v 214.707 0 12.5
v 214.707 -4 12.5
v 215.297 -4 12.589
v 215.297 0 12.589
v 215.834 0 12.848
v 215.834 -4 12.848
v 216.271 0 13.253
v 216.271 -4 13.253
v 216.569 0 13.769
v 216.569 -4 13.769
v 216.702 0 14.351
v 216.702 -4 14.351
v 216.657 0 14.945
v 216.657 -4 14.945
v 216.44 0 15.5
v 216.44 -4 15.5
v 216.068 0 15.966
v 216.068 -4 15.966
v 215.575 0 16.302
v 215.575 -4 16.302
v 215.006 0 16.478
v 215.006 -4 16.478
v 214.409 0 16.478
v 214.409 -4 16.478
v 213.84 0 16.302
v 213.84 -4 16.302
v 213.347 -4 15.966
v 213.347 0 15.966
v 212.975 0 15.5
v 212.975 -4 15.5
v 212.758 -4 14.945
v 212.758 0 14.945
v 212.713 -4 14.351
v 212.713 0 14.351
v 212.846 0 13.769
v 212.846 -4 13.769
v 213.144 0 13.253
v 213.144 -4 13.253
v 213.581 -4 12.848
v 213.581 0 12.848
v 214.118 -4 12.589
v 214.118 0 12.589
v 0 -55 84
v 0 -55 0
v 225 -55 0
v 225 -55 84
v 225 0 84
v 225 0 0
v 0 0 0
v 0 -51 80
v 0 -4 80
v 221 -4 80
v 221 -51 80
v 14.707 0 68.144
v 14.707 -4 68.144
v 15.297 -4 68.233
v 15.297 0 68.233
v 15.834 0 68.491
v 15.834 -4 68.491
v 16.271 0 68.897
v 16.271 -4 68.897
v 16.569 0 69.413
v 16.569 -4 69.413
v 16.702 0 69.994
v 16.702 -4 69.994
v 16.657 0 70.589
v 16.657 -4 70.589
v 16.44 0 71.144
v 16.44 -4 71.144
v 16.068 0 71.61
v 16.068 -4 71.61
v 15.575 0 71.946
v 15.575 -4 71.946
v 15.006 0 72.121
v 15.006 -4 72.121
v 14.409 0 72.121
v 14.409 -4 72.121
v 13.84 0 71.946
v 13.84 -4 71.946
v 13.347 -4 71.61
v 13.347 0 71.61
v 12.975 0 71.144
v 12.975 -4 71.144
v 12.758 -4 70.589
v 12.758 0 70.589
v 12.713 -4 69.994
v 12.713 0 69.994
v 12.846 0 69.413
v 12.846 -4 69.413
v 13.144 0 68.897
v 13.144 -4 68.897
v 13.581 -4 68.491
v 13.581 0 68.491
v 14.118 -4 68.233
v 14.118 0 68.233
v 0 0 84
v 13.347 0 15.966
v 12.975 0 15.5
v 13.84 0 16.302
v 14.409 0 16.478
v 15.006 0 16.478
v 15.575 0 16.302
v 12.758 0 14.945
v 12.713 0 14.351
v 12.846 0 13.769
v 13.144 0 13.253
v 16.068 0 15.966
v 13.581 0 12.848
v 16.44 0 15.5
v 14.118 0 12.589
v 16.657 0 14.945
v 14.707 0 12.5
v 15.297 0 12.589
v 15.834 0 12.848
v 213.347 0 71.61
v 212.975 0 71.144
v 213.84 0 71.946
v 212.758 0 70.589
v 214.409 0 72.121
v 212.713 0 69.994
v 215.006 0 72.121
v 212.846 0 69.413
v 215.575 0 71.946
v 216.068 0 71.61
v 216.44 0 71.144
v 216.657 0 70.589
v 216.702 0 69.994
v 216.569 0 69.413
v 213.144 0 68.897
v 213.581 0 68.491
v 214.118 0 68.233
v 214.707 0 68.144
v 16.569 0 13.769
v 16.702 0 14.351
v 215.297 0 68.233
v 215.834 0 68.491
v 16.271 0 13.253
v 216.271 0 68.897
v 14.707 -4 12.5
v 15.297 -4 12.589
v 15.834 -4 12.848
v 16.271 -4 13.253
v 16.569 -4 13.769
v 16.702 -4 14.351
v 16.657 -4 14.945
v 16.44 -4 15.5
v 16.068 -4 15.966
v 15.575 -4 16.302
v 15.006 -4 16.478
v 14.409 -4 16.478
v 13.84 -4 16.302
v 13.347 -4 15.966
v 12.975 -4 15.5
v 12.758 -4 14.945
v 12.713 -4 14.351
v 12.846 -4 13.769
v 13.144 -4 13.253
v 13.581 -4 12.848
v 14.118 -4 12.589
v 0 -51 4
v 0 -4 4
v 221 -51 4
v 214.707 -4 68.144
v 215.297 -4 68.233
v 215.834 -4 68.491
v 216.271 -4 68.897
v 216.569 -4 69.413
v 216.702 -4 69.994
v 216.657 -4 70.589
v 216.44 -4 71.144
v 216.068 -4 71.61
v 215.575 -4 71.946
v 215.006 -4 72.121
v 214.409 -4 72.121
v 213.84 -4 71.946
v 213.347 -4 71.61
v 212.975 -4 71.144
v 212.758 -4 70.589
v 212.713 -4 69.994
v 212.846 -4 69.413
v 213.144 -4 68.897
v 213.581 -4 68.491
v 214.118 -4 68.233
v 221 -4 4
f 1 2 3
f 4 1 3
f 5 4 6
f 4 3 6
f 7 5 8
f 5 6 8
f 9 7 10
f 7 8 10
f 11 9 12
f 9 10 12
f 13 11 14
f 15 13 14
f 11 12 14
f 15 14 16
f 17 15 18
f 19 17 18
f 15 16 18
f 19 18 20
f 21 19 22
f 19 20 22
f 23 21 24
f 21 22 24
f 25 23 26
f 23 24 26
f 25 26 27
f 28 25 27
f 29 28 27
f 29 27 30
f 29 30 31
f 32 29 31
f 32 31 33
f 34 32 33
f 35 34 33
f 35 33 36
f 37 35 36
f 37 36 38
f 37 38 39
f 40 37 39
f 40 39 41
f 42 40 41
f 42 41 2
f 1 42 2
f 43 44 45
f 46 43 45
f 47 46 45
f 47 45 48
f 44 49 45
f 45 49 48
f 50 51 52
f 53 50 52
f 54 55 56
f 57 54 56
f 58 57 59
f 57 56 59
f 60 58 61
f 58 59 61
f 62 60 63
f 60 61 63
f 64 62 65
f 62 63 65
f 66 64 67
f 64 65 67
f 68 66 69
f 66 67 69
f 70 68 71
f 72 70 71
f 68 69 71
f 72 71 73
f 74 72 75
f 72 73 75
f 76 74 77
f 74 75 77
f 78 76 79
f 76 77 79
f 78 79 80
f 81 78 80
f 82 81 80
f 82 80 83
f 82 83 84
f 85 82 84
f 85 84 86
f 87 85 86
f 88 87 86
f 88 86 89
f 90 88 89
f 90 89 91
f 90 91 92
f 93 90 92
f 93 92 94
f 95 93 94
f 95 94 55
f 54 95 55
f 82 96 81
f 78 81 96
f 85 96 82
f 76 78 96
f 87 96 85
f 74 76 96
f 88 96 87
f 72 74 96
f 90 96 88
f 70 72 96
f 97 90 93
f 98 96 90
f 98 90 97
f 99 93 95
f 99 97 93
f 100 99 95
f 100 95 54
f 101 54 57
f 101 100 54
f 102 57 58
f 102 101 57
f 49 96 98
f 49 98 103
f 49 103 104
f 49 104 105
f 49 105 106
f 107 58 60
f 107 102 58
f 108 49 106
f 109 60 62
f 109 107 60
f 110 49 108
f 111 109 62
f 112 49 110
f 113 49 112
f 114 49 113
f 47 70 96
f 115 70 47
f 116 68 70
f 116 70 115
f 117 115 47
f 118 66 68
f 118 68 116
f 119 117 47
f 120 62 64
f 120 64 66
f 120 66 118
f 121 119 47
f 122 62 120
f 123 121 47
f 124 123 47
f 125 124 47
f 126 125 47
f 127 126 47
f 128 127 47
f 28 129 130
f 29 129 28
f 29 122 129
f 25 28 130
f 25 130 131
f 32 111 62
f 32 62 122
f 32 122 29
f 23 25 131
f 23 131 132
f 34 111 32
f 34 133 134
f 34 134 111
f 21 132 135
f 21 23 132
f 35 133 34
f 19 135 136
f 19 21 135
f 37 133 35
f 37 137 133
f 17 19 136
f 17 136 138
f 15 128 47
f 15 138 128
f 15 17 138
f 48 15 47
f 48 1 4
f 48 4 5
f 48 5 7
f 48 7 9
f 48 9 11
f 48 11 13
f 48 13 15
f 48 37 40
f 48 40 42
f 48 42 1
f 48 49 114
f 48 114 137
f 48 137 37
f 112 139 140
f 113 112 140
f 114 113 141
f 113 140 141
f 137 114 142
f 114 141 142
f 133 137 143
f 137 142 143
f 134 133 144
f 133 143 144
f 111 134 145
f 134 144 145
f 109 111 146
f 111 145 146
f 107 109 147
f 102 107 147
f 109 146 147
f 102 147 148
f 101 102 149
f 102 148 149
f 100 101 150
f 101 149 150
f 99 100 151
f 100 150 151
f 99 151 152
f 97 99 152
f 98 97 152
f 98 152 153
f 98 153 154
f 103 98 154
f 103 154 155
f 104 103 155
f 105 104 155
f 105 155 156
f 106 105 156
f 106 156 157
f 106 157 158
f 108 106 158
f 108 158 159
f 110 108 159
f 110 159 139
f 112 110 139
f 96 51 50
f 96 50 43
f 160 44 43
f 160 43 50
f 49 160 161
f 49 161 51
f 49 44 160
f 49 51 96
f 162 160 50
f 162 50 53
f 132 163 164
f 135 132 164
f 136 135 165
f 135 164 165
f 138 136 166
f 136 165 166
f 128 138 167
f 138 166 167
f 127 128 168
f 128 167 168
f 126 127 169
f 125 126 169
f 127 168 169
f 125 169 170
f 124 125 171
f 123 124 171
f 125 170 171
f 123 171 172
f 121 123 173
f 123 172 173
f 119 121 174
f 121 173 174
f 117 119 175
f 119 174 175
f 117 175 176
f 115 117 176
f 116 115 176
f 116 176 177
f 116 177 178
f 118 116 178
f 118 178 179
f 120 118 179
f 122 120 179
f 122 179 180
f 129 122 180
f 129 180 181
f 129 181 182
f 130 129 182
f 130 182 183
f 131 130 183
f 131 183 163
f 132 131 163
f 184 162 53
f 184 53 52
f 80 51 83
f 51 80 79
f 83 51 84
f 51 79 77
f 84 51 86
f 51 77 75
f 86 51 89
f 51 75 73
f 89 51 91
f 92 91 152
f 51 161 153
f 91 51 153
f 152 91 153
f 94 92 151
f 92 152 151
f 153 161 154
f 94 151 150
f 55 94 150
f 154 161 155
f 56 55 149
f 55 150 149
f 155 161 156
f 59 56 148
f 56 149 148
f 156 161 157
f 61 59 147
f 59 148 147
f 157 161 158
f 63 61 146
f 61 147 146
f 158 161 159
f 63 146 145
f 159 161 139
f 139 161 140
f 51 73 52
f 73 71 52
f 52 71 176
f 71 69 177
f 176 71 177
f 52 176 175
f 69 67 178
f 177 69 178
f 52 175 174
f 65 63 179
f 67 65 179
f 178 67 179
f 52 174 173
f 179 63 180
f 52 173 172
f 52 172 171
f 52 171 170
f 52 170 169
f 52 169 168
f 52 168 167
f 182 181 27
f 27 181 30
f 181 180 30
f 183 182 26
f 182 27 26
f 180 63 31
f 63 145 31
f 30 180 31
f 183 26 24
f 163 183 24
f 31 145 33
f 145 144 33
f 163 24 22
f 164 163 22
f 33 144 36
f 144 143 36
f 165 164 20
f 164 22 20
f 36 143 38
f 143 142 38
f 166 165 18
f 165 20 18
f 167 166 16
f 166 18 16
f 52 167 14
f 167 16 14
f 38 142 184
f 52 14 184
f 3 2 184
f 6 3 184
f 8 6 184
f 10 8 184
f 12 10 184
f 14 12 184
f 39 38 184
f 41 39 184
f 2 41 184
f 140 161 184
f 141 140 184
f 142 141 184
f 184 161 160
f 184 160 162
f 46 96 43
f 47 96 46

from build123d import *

# Parameters (mm, degrees)
SKETCH1_W           = 225
SKETCH1_H           = 55
BOSS_EXTRUDE1_DEPTH = 84
SHELL1_T            = -4
SKETCH2_R           = 2
CUT_EXTRUDE1_DEPTH  = 246.523929587


with BuildPart() as part:
    # Sketch1 → Boss-Extrude1 (new body)
    with BuildSketch(Plane.XY):
        with Locations((112.5, -27.5)):
            Rectangle(SKETCH1_W, SKETCH1_H)
    extrude(amount=BOSS_EXTRUDE1_DEPTH)

    # Shell1
    shell1_openings = [part.faces().sort_by_distance(p)[0] for p in [
        (0, -27.5, 42),
    ]]
    offset(amount=SHELL1_T, openings=shell1_openings, kind=Kind.INTERSECTION)

    # Sketch2 → Cut-Extrude1 (cut, through all)
    with BuildSketch(Plane.XZ.offset(4)):
        with Locations(Location((14.707468467, 70.14380551, 0), (0, 0, 270))):
            Circle(SKETCH2_R)
        with Locations(Location((14.707468467, 14.5, 0), (0, 0, 270))):
            Circle(SKETCH2_R)
        with Locations(Location((214.707468467, 70.14380551, 0), (0, 0, 270))):
            Circle(SKETCH2_R)
        with Locations(Location((214.707468467, 14.5, 0), (0, 0, 270))):
            Circle(SKETCH2_R)
    extrude(amount=-CUT_EXTRUDE1_DEPTH, mode=Mode.SUBTRACT)


solid = part.part
